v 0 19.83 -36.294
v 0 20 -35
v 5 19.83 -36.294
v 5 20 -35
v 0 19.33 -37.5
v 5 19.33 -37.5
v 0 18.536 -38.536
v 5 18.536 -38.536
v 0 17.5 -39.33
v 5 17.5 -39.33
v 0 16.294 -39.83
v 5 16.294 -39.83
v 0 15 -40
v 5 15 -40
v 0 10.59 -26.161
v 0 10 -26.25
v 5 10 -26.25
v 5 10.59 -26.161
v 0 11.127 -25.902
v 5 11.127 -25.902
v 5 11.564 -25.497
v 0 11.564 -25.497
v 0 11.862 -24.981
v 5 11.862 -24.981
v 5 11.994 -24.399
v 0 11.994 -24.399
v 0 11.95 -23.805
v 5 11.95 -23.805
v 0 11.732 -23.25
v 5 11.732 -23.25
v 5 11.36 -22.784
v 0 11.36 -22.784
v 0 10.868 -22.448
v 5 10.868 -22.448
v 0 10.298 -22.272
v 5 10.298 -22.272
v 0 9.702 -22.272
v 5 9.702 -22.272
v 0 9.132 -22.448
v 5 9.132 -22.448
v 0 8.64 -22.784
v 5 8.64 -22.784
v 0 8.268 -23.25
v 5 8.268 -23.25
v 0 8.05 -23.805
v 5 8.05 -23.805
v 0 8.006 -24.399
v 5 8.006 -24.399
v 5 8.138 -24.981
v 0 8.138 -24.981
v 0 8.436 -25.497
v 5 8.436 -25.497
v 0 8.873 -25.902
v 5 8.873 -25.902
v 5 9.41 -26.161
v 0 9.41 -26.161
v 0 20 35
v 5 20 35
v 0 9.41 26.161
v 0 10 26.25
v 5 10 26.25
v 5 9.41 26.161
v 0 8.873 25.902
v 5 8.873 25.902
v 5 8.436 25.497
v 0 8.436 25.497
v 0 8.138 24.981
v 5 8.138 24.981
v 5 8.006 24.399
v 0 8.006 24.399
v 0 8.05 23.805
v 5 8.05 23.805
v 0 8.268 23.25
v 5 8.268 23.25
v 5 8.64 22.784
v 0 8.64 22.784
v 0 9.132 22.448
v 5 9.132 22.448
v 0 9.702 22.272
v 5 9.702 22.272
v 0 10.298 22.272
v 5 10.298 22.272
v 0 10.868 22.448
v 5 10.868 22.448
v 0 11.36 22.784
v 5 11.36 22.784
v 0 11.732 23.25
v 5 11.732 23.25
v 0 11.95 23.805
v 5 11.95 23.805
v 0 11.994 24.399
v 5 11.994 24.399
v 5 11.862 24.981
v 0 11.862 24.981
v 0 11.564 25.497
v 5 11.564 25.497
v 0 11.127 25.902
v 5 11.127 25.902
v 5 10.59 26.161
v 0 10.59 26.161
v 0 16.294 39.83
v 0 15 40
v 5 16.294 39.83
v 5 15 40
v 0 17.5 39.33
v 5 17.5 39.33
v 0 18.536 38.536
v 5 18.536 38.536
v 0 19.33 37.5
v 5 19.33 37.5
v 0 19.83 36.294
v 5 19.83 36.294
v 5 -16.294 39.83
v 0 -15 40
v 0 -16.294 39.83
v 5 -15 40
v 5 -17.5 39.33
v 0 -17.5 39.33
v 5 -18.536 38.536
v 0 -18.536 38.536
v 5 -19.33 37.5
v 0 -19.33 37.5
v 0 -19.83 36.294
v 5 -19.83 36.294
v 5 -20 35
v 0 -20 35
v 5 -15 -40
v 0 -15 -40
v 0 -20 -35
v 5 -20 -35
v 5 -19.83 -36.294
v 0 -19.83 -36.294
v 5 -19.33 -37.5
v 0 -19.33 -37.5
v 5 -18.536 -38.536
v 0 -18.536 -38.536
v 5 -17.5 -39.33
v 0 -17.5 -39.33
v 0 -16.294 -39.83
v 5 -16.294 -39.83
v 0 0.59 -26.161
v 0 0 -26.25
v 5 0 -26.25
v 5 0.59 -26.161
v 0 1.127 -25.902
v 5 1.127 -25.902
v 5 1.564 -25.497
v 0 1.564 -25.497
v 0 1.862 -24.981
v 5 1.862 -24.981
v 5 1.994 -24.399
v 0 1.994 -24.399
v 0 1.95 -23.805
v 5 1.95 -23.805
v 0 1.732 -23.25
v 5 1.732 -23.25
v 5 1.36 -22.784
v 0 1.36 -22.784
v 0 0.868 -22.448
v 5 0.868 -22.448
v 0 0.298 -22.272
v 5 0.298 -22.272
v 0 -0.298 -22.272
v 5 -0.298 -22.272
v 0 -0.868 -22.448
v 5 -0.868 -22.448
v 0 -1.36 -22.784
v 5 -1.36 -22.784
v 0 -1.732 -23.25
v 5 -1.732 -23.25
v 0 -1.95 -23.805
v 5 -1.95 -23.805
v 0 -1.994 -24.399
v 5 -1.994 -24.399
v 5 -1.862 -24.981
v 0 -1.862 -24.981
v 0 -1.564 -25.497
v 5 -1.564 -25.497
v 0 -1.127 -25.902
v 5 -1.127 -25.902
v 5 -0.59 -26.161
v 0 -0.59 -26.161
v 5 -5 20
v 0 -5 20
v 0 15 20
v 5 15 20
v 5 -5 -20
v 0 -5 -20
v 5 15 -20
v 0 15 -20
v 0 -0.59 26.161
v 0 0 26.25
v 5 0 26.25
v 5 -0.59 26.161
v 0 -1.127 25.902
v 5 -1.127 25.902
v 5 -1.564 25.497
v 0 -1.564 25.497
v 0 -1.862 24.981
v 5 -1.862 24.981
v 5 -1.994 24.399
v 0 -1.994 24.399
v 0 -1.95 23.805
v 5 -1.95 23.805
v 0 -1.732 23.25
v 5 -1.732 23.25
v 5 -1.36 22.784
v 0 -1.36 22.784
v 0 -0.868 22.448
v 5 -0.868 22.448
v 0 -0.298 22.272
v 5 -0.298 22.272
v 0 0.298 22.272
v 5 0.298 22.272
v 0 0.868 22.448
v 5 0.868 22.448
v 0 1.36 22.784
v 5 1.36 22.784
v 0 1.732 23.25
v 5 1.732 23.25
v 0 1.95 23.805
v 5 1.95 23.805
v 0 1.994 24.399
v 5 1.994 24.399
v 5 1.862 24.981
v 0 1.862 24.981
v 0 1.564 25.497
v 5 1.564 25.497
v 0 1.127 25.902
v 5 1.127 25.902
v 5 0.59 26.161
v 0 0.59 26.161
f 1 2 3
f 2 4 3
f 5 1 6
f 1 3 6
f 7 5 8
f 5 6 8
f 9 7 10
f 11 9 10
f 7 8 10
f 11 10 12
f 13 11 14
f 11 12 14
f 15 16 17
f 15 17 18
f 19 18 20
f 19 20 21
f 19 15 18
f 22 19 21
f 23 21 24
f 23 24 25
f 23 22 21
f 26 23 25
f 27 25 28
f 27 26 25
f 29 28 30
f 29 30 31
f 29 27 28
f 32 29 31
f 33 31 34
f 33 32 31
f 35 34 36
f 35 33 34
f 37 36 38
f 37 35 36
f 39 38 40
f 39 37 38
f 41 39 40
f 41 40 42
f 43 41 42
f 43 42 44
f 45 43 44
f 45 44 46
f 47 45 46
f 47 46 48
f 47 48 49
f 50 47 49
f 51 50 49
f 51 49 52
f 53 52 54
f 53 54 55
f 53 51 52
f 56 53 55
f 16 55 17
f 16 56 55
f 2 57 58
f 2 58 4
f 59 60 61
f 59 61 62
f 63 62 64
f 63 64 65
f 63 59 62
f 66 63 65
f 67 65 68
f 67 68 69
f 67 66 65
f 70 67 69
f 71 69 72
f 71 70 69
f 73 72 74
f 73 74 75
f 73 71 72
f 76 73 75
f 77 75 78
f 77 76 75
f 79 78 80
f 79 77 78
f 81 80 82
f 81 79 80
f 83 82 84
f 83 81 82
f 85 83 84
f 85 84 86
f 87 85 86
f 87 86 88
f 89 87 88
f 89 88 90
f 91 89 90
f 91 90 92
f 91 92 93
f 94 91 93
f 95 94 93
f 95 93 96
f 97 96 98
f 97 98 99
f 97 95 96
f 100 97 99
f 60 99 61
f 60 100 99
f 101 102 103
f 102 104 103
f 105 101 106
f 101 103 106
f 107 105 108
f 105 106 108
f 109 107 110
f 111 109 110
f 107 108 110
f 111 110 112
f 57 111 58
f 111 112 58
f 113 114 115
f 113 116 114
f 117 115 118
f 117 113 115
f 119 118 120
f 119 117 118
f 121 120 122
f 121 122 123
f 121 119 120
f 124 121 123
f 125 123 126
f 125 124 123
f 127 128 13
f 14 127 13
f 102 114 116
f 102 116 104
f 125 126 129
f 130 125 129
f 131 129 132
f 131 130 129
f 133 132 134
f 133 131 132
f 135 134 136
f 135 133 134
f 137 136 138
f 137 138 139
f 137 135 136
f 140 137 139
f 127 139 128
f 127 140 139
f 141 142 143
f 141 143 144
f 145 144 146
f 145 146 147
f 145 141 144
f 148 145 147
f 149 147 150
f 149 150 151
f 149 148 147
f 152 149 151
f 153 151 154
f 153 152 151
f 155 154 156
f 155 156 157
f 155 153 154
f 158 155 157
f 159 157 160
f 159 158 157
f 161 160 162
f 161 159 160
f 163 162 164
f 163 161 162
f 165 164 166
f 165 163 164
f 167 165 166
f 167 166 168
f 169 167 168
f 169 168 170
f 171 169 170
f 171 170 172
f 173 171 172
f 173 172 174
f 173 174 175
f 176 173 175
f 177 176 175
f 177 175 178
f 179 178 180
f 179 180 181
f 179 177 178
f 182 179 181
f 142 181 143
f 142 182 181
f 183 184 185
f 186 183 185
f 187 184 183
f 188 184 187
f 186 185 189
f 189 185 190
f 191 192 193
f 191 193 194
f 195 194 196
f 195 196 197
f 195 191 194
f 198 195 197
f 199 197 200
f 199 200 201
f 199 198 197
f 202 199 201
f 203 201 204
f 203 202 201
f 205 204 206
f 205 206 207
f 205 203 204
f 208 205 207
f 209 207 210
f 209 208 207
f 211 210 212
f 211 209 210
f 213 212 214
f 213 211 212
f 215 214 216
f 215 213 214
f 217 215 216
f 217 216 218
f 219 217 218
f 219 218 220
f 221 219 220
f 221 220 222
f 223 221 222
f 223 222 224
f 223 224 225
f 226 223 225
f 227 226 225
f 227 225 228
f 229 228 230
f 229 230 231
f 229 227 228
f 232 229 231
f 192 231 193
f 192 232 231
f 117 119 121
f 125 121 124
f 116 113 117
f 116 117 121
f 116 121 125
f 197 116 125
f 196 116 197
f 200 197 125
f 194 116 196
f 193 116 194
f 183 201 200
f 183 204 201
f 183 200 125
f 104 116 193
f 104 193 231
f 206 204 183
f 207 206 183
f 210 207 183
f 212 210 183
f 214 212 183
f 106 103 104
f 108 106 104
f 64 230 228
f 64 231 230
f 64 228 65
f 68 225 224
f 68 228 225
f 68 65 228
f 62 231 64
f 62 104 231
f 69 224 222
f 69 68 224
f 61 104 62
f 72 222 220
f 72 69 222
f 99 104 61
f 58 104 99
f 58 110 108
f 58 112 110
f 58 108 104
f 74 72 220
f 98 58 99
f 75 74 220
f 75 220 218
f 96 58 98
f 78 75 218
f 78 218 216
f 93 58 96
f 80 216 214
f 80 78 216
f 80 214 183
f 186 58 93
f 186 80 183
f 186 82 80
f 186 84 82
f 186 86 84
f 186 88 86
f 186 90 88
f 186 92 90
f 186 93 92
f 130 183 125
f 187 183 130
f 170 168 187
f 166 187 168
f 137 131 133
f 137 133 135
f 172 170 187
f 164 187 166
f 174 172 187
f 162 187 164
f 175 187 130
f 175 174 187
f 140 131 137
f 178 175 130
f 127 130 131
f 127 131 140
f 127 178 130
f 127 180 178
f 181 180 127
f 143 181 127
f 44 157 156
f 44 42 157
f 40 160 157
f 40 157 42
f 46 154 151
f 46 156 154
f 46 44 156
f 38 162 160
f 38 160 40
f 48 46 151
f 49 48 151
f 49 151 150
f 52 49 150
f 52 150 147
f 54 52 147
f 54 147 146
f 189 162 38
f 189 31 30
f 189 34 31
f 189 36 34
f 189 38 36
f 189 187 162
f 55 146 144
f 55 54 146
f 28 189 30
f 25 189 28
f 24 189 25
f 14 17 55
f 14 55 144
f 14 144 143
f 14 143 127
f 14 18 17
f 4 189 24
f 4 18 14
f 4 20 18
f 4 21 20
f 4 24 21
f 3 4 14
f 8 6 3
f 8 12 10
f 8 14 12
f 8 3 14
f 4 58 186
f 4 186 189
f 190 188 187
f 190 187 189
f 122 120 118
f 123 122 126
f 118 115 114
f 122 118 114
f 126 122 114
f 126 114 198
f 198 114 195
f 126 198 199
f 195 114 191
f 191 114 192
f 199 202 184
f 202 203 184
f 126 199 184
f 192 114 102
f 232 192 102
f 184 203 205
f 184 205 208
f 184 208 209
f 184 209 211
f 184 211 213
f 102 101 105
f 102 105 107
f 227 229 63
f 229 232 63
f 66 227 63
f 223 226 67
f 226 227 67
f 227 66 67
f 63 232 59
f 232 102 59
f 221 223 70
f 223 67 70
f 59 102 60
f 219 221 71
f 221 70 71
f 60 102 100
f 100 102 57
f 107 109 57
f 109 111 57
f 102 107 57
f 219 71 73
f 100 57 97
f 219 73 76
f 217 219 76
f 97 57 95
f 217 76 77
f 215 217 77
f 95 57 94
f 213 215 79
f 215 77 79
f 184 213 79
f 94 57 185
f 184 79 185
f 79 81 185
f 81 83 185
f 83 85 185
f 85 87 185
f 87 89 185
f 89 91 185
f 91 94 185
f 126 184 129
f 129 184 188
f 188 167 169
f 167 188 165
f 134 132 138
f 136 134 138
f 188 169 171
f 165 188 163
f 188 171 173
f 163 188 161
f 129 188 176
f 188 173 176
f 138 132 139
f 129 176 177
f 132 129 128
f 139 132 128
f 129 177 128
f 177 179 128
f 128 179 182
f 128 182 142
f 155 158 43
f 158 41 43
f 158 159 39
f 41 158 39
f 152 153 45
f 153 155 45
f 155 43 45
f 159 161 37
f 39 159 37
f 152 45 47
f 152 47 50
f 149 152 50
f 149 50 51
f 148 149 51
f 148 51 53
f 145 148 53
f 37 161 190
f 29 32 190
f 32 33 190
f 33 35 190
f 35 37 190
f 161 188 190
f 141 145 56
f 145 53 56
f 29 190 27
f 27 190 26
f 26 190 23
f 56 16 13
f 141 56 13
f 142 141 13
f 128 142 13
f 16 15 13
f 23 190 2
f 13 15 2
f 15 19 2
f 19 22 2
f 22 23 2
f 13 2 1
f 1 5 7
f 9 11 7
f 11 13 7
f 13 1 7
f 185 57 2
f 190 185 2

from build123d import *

# Parameters (mm, degrees)
SKETCH1_W           = 80
SKETCH1_H           = 40
SKETCH1_R           = 2
SKETCH1_W_2         = 40
SKETCH1_H_2         = 20
BOSS_EXTRUDE1_DEPTH = 5
FILLET1_R           = 5


with BuildPart() as part:
    # Sketch1 → Boss-Extrude1 (new body)
    with BuildSketch(Plane(origin=(0, 0, 0), x_dir=(0, 0, -1), z_dir=(1, 0, 0))):
        Rectangle(SKETCH1_W, SKETCH1_H)
        with Locations((24.25, 10)):
            Circle(SKETCH1_R, mode=Mode.SUBTRACT)
        with Locations((24.25, 0)):
            Circle(SKETCH1_R, mode=Mode.SUBTRACT)
        with Locations(Location((-24.25, 10, 0), (0, 0, 180))):
            Circle(SKETCH1_R, mode=Mode.SUBTRACT)
        with Locations(Location((-24.25, 0, 0), (0, 0, 180))):
            Circle(SKETCH1_R, mode=Mode.SUBTRACT)
        with Locations((0, 5)):
            Rectangle(SKETCH1_W_2, SKETCH1_H_2, mode=Mode.SUBTRACT)
    extrude(amount=BOSS_EXTRUDE1_DEPTH)

    # Fillet1
    fillet1_edges = [part.edges().sort_by_distance(p)[0] for p in [
        (2.5, 20, 40),
        (2.5, 20, -40),
        (2.5, -20, -40),
        (2.5, -20, 40),
    ]]
    fillet(fillet1_edges, radius=FILLET1_R)


solid = part.part
